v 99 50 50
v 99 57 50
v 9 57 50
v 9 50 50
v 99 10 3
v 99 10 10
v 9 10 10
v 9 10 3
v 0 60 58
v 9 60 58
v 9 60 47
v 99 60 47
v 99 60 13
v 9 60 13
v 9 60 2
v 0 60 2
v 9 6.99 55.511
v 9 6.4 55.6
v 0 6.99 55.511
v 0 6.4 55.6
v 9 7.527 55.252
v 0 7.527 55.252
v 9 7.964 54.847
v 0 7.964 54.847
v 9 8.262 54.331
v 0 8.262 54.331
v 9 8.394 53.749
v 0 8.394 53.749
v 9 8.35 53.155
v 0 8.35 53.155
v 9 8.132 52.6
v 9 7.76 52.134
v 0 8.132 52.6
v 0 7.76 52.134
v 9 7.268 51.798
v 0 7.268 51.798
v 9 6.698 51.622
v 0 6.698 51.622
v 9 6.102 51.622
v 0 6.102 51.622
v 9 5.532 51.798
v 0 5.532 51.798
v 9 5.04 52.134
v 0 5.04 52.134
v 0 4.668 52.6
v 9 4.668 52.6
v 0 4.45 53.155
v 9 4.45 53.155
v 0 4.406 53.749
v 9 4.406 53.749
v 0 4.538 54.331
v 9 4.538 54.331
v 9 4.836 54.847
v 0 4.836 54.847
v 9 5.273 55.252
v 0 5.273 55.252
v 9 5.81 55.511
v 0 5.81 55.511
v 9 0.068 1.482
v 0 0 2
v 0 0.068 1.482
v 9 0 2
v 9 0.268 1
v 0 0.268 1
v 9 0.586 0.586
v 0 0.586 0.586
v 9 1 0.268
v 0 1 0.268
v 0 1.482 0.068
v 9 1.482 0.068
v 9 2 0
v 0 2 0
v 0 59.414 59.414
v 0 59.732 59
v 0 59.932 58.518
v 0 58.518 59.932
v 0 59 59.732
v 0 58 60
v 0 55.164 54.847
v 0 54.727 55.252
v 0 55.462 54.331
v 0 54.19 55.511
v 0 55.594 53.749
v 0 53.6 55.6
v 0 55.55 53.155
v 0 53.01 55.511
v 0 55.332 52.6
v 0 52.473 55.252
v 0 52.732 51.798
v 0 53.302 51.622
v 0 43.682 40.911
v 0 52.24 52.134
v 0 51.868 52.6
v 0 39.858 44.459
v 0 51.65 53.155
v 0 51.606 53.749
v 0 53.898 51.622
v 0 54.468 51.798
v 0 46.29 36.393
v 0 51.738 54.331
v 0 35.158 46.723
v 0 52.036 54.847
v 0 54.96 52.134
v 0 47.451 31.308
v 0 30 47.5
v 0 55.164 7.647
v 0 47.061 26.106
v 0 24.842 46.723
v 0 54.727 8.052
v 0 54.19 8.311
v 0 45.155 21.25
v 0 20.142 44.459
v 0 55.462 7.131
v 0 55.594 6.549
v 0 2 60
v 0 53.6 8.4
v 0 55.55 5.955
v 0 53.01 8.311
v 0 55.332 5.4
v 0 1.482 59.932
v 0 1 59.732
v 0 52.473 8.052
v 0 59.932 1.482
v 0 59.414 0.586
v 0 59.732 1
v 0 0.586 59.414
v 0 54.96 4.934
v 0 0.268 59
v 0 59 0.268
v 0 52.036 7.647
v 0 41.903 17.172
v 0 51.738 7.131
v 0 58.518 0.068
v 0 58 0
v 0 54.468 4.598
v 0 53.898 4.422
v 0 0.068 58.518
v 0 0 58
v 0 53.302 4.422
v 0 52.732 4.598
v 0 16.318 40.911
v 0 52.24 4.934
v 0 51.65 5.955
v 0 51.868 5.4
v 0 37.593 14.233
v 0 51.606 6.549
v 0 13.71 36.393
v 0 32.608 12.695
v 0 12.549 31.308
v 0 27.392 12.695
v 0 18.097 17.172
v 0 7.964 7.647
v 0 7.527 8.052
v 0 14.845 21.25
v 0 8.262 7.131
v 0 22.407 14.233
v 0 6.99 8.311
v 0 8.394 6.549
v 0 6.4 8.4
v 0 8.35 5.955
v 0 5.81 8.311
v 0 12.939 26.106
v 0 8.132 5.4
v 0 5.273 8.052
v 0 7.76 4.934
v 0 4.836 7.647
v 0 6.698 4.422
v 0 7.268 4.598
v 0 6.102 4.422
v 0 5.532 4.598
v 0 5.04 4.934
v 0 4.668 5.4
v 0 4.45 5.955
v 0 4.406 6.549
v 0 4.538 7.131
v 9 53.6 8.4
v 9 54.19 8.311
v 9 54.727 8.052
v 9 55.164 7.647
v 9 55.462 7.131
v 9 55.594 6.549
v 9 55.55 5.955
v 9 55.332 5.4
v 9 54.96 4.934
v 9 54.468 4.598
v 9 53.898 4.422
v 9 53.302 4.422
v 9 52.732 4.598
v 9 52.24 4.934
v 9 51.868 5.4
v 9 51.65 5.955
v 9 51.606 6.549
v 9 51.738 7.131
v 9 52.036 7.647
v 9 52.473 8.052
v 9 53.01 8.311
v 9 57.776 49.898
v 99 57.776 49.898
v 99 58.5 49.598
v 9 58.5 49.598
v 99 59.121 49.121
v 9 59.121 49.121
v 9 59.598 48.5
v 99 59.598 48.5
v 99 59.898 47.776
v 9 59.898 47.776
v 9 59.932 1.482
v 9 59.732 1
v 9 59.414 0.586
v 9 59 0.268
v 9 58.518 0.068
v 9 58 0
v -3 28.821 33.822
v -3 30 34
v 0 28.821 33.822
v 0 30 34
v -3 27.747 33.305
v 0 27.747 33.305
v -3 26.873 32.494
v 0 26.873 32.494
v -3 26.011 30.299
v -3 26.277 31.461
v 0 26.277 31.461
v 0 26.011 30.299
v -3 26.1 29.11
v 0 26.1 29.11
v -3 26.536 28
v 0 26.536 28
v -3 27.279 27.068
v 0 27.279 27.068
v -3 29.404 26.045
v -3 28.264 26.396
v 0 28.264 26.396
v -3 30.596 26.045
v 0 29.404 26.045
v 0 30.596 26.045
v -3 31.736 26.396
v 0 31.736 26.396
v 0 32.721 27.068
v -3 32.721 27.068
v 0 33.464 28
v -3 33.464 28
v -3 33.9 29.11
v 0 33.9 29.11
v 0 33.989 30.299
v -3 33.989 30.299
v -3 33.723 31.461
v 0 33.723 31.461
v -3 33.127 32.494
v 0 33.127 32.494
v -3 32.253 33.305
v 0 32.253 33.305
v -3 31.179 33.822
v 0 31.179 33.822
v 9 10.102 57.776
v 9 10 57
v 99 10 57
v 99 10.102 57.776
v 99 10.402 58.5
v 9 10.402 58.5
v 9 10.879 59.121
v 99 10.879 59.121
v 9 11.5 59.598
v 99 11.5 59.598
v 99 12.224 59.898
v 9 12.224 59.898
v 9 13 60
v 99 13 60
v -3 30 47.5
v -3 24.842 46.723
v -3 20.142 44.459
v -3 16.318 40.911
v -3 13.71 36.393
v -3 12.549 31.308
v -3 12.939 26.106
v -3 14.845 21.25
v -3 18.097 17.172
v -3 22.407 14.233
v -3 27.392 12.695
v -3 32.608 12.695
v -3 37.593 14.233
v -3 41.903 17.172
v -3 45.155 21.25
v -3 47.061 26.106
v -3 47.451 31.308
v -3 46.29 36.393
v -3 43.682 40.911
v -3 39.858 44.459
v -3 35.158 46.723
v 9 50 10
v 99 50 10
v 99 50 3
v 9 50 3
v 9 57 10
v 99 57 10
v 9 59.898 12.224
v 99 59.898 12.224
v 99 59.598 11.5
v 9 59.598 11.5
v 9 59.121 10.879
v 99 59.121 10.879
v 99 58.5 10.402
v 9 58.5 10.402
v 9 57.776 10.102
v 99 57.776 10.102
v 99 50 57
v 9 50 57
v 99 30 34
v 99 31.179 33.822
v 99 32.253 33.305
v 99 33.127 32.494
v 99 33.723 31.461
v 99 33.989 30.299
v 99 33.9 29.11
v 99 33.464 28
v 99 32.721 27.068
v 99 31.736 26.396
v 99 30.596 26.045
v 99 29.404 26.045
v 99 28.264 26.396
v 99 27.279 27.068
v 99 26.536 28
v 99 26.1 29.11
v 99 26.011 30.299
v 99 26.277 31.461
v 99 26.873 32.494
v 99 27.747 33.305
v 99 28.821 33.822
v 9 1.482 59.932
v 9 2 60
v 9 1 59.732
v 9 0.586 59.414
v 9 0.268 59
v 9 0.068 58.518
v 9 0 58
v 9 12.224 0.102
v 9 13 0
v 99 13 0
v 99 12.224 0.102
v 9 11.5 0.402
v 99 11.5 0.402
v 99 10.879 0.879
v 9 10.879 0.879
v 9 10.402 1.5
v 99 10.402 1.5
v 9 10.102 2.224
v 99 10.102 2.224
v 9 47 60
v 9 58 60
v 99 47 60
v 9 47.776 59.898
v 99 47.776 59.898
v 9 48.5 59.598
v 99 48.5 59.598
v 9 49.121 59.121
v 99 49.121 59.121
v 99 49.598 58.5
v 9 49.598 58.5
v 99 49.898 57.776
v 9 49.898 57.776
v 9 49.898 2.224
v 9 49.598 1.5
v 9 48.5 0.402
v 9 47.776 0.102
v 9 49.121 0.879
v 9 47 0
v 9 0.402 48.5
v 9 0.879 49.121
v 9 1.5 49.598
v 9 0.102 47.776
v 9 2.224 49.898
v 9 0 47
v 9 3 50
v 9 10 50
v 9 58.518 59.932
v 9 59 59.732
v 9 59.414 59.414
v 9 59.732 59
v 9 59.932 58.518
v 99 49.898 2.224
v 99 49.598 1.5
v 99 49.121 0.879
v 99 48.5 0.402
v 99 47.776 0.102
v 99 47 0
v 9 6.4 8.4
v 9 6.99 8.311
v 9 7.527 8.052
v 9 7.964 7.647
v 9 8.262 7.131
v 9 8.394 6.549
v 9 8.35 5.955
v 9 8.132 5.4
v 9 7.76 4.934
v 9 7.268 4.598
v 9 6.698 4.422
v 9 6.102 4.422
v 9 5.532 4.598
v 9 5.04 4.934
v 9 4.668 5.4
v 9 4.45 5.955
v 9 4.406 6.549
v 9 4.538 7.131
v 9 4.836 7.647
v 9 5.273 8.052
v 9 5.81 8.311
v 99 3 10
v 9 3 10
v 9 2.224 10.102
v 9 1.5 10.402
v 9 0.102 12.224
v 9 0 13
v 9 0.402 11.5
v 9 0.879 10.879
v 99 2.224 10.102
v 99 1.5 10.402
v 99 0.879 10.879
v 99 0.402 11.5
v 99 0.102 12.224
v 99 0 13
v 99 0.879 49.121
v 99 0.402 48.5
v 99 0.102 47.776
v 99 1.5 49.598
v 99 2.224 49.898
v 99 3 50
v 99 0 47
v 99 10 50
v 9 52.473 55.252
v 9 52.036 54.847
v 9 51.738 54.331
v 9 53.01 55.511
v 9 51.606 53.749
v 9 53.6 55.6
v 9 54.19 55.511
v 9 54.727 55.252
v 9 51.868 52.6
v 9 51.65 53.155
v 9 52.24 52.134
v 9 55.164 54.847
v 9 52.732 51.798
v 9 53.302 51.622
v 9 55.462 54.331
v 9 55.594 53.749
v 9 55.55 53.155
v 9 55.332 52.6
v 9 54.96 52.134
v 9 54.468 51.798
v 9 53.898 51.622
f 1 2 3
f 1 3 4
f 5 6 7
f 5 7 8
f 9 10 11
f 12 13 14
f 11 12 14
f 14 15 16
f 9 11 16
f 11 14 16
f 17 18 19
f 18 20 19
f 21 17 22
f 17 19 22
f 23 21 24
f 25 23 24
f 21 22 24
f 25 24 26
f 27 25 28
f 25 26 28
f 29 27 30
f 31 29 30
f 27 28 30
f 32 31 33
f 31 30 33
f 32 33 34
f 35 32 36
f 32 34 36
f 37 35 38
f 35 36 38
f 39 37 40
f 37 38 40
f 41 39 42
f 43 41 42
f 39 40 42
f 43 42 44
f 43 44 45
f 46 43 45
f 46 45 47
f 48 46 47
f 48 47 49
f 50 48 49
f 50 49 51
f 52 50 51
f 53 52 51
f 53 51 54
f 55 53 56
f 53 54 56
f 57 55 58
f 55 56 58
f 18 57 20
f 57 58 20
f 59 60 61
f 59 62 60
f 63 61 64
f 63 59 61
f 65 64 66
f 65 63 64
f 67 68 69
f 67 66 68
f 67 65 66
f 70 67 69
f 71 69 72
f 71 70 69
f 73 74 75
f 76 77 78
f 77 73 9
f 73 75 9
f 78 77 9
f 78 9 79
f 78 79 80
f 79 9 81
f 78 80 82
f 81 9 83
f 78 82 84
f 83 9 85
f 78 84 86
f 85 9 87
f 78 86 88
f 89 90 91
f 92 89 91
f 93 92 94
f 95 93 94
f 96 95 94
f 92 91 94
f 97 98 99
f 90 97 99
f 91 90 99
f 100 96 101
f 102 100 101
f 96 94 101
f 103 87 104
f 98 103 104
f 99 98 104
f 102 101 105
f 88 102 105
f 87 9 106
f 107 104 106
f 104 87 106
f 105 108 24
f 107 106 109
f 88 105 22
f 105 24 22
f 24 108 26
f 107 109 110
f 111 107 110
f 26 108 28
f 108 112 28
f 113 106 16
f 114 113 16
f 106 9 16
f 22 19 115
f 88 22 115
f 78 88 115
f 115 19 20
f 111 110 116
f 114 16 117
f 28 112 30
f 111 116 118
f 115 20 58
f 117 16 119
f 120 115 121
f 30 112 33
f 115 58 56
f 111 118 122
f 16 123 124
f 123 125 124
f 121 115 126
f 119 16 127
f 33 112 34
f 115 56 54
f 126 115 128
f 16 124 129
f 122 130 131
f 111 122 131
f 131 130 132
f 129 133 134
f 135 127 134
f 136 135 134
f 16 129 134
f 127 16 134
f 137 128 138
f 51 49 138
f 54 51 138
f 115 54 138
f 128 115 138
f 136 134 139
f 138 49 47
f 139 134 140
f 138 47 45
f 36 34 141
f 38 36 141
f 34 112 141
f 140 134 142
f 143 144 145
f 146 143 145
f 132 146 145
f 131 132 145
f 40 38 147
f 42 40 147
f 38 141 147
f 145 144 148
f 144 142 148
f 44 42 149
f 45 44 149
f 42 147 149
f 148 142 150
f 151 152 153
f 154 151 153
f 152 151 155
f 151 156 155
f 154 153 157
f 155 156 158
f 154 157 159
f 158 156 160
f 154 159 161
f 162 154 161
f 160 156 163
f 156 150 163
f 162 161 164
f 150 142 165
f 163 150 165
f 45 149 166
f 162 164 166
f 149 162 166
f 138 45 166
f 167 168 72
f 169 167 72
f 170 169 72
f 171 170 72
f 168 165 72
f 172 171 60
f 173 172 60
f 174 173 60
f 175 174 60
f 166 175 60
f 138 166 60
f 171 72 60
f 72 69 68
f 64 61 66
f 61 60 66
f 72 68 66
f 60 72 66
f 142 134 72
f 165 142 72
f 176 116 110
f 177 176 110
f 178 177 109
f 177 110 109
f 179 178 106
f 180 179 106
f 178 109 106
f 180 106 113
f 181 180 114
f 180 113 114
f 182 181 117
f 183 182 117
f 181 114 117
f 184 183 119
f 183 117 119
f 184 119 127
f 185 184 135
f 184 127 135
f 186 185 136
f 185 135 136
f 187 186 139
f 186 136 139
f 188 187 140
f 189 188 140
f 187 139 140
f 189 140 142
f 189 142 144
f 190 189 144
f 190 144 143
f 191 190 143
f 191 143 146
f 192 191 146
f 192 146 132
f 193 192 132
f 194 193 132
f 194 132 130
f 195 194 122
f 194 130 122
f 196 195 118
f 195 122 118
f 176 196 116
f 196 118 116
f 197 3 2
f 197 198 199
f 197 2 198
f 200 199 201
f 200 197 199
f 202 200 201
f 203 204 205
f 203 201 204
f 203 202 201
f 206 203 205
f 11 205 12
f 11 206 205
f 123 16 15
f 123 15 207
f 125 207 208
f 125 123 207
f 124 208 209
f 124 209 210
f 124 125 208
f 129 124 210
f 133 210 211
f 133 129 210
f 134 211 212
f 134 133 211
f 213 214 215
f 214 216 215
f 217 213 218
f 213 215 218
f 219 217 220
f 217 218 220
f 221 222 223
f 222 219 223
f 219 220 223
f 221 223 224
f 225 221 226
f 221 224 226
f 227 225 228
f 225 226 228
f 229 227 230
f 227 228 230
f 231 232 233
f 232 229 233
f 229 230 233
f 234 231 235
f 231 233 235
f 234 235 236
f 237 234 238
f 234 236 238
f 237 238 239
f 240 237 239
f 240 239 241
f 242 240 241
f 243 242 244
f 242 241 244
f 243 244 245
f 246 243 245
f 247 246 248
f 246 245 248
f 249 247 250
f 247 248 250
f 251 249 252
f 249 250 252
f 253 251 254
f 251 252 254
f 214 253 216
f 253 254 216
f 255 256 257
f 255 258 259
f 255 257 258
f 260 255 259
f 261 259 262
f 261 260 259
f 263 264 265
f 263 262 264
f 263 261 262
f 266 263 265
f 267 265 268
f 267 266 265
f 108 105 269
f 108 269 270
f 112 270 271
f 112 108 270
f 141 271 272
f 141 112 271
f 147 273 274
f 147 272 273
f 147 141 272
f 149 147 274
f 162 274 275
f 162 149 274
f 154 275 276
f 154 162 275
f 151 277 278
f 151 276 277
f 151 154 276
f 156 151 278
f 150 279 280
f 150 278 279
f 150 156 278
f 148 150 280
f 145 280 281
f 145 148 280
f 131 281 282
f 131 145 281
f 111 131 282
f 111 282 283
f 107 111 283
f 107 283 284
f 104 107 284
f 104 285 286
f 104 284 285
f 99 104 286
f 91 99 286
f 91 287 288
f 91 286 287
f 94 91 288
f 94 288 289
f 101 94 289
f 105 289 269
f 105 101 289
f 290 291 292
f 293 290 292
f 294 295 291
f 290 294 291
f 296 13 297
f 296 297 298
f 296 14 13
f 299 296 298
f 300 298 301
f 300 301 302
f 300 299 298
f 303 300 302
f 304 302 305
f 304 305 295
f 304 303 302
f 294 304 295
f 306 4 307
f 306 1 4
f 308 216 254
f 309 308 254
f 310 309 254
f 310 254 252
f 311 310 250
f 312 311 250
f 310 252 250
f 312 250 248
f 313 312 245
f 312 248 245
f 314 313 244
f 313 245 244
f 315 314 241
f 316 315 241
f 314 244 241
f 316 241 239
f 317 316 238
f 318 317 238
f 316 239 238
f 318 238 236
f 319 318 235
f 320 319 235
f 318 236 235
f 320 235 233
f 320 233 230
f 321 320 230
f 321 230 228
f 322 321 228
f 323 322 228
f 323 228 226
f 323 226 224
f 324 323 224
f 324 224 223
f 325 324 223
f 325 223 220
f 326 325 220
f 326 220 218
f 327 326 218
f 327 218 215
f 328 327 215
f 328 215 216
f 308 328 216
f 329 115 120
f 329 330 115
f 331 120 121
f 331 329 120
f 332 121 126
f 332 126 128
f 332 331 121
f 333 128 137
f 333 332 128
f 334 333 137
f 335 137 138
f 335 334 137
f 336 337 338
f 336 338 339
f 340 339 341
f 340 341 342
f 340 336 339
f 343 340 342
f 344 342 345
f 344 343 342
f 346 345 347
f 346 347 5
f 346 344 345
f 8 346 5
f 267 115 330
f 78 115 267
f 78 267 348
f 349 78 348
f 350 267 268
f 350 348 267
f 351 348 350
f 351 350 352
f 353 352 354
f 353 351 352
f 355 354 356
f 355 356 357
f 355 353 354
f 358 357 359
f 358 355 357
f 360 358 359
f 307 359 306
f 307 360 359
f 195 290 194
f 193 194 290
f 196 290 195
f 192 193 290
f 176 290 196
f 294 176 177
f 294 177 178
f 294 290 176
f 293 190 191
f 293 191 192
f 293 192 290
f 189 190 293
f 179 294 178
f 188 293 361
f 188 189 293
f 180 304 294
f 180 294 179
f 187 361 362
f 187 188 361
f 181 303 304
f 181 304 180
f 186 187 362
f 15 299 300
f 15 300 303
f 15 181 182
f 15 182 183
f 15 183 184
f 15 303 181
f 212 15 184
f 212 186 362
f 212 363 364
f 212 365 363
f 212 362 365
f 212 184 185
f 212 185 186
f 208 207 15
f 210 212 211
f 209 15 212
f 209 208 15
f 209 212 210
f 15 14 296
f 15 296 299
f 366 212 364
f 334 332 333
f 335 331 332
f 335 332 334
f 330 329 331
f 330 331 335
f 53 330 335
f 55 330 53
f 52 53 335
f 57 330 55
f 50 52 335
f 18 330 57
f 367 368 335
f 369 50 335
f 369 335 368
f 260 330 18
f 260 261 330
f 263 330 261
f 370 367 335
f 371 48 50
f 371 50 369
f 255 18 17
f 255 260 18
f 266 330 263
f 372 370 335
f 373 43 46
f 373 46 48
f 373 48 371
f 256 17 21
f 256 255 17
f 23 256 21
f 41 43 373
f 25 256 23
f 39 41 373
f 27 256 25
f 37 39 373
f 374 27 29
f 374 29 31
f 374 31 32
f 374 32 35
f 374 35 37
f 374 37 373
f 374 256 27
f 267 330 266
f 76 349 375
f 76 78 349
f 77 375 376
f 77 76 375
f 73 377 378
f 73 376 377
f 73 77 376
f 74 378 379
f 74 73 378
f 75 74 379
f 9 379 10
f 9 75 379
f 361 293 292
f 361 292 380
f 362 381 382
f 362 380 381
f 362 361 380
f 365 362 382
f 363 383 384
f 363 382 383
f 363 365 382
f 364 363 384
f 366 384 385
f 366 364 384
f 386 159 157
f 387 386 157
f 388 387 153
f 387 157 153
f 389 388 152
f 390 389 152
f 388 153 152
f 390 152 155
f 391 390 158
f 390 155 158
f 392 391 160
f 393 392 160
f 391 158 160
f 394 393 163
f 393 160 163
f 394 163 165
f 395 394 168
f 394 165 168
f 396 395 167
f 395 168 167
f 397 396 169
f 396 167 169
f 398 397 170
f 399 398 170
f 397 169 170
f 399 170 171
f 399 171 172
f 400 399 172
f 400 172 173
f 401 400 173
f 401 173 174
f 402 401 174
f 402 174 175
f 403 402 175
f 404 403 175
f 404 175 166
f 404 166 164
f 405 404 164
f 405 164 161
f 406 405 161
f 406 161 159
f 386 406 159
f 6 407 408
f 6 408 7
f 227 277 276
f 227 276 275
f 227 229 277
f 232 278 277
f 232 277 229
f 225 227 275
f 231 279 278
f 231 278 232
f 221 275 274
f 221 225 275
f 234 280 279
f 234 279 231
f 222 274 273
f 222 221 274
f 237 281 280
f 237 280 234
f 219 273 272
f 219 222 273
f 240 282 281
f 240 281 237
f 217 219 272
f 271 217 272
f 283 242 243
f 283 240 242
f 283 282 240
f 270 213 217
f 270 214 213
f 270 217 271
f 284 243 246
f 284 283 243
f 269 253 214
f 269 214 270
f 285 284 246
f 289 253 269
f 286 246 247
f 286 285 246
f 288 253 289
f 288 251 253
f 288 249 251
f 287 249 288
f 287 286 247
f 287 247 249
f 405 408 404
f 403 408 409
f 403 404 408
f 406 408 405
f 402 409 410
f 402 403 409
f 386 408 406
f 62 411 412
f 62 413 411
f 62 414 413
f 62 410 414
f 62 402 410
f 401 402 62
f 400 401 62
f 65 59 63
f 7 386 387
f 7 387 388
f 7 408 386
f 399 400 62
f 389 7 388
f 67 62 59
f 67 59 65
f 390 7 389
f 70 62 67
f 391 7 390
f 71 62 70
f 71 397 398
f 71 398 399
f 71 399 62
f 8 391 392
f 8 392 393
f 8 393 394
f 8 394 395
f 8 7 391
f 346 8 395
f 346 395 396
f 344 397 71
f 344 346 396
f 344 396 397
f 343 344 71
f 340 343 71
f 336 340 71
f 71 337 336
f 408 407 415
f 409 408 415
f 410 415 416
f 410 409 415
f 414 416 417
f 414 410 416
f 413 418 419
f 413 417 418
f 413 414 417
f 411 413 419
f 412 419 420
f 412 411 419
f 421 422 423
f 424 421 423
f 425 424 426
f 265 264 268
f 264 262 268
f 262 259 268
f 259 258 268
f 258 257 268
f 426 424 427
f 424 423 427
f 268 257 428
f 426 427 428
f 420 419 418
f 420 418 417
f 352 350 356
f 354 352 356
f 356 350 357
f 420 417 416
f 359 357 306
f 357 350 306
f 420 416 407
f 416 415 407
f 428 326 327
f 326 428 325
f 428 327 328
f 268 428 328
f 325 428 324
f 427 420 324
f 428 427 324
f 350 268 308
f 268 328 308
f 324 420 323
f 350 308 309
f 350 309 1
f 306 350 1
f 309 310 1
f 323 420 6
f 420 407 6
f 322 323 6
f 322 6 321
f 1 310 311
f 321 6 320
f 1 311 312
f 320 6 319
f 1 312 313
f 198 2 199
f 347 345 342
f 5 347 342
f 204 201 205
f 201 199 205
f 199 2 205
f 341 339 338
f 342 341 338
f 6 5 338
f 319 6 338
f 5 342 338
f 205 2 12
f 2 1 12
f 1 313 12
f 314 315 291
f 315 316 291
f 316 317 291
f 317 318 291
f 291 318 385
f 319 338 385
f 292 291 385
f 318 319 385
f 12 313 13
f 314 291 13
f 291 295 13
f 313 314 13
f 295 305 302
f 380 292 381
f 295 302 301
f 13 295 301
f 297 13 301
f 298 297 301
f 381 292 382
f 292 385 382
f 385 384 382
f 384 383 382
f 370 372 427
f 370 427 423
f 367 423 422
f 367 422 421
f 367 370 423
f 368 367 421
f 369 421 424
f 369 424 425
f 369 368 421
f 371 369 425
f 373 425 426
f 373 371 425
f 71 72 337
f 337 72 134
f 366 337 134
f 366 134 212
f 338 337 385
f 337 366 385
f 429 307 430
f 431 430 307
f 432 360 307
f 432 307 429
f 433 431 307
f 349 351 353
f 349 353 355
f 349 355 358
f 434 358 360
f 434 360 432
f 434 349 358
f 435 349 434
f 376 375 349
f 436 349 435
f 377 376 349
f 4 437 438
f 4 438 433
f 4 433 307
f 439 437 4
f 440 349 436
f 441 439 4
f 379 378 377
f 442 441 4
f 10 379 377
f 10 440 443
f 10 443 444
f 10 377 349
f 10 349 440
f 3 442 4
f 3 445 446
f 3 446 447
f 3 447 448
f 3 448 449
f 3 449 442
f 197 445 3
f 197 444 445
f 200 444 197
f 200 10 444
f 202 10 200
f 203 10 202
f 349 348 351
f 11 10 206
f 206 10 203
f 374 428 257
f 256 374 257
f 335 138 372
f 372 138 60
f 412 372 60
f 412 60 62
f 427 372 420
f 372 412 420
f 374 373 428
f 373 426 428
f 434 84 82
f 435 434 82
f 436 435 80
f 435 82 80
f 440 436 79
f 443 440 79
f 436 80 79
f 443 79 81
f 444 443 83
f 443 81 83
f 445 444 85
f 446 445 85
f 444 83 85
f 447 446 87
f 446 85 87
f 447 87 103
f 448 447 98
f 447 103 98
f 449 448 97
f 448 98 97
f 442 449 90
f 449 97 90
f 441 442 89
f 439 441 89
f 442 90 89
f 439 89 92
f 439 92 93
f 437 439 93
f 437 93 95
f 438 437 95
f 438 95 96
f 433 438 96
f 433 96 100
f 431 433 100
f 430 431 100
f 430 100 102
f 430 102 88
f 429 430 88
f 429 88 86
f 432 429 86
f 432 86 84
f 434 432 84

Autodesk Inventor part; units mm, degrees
ref_plane "YZ Plane" through (0, 0, 0) normal (1, 0, 0) x (0, 1, 0)
ref_plane "XZ Plane" through (0, 0, 0) normal (0, 1, 0) x (-1, 0, 0)
ref_plane "XY Plane" through (0, 0, 0) normal (0, 0, 1) x (1, 0, 0)
sketch "Sketch2" plane through (0, 0, 0) normal (0, 0, 1) x (1, 0, 0)
  line L0 (0, 0) -> (99, 0)
  line L1 (99, 0) -> (99, 60)
  line L2 (99, 60) -> (0, 60)
  line L3 (0, 60) -> (0, 0)
  dimension "d2" = 99
  dimension "d3" = 60
extrude "Extrusion1" add sketch "Sketch2" along normal blind 60
sketch "Sketch3" plane through (0, 0, 0) normal (-1, 0, 0) x (0, 0, 1)
  circle A0 centre (30, 30) radius 4
  line L0 (0, 60) -> (60, 60) projected
  line L1 (0, 60) -> (0, 0) projected
  point P0 (30, 60)
  point P1 (0, 30)
  dimension "d6" = 8
extrude "Extrusion2" cut sketch "Sketch3" against normal through all
sketch "Sketch4" plane through (99, 0, 0) normal (1, 0, 0) x (0, 0, -1)
  line L0 (0, 60) -> (-60, 60) projected
  line L1 (-60, 60) -> (-50, 60)
  line L2 (-50, 60) -> (-50, 50)
  line L3 (-50, 50) -> (-60, 50)
  line L4 (-60, 50) -> (-60, 60)
  line L5 (0, 60) -> (-10, 60)
  line L6 (-10, 60) -> (-10, 50)
  line L7 (-10, 50) -> (0, 50)
  line L8 (0, 50) -> (0, 60)
  line L9 (0, 0) -> (-10, 0)
  line L10 (-10, 0) -> (-10, 10)
  line L11 (-10, 10) -> (0, 10)
  line L12 (0, 10) -> (0, 0)
  line L13 (-60, 0) -> (-50, 0)
  line L14 (-50, 0) -> (-50, 10)
  line L15 (-50, 10) -> (-60, 10)
  line L16 (-60, 10) -> (-60, 0)
  dimension "d9" = 10
  dimension "d10" = 10
  dimension "d11" = 10
  dimension "d12" = 10
  dimension "d13" = 10
  dimension "d14" = 10
  dimension "d15" = 10
  dimension "d16" = 10
extrude "Extrusion3" cut sketch "Sketch4" against normal blind 90
fillet "Fillet1" radius 3 8 edges at (54, 50, 60) (54, 60, 50) (54, 60, 10) (54, 50, 0) (54, 10, 60) (54, 0, 50) (54, 0, 10) (54, 10, 0)
fillet "Fillet2" radius 2 4 edges at (4.5, 60, 60) (4.5, 0, 60) (4.5, 60, 0) (4.5, 0, 0)
sketch "Sketch5" plane through (0, 2, 0) normal (-1, 0, 0) x (0, 0, 1)
  circle A0 centre (30, 28) radius 4 projected
  circle A1 centre (30, 28) radius 17.5
  point P0 (0, -2)
  dimension "d21" = 35
extrude "Extrusion4" add sketch "Sketch5" along normal blind 3
sketch "Sketch6" plane through (0, 2, 0) normal (-1, 0, 0) x (0, 0, 1)
  line L0 (6.4, 4.4) -> (53.6, 4.4) construction
  line L1 (53.6, 4.4) -> (53.6, 51.6) construction
  line L2 (53.6, 51.6) -> (6.4, 51.6) construction
  line L3 (6.4, 51.6) -> (6.4, 4.4) construction
  circle A0 centre (6.4, 51.6) radius 2
  circle A1 centre (53.6, 51.6) radius 2
  circle A2 centre (53.6, 4.4) radius 2
  circle A3 centre (6.4, 4.4) radius 2
  circle A4 centre (30, 28) radius 4 construction
  point P0 (0, -2)
  point P1 (30, 51.6)
  point P2 (53.6, 28)
  dimension "d24" = 47.2
  dimension "d25" = 47.2
  dimension "d26" = 4
  dimension "d27" = 4
  dimension "d28" = 4
  dimension "d29" = 4
extrude "Extrusion5" cut sketch "Sketch6" against normal through all
properties material "Steel, Carbon"
